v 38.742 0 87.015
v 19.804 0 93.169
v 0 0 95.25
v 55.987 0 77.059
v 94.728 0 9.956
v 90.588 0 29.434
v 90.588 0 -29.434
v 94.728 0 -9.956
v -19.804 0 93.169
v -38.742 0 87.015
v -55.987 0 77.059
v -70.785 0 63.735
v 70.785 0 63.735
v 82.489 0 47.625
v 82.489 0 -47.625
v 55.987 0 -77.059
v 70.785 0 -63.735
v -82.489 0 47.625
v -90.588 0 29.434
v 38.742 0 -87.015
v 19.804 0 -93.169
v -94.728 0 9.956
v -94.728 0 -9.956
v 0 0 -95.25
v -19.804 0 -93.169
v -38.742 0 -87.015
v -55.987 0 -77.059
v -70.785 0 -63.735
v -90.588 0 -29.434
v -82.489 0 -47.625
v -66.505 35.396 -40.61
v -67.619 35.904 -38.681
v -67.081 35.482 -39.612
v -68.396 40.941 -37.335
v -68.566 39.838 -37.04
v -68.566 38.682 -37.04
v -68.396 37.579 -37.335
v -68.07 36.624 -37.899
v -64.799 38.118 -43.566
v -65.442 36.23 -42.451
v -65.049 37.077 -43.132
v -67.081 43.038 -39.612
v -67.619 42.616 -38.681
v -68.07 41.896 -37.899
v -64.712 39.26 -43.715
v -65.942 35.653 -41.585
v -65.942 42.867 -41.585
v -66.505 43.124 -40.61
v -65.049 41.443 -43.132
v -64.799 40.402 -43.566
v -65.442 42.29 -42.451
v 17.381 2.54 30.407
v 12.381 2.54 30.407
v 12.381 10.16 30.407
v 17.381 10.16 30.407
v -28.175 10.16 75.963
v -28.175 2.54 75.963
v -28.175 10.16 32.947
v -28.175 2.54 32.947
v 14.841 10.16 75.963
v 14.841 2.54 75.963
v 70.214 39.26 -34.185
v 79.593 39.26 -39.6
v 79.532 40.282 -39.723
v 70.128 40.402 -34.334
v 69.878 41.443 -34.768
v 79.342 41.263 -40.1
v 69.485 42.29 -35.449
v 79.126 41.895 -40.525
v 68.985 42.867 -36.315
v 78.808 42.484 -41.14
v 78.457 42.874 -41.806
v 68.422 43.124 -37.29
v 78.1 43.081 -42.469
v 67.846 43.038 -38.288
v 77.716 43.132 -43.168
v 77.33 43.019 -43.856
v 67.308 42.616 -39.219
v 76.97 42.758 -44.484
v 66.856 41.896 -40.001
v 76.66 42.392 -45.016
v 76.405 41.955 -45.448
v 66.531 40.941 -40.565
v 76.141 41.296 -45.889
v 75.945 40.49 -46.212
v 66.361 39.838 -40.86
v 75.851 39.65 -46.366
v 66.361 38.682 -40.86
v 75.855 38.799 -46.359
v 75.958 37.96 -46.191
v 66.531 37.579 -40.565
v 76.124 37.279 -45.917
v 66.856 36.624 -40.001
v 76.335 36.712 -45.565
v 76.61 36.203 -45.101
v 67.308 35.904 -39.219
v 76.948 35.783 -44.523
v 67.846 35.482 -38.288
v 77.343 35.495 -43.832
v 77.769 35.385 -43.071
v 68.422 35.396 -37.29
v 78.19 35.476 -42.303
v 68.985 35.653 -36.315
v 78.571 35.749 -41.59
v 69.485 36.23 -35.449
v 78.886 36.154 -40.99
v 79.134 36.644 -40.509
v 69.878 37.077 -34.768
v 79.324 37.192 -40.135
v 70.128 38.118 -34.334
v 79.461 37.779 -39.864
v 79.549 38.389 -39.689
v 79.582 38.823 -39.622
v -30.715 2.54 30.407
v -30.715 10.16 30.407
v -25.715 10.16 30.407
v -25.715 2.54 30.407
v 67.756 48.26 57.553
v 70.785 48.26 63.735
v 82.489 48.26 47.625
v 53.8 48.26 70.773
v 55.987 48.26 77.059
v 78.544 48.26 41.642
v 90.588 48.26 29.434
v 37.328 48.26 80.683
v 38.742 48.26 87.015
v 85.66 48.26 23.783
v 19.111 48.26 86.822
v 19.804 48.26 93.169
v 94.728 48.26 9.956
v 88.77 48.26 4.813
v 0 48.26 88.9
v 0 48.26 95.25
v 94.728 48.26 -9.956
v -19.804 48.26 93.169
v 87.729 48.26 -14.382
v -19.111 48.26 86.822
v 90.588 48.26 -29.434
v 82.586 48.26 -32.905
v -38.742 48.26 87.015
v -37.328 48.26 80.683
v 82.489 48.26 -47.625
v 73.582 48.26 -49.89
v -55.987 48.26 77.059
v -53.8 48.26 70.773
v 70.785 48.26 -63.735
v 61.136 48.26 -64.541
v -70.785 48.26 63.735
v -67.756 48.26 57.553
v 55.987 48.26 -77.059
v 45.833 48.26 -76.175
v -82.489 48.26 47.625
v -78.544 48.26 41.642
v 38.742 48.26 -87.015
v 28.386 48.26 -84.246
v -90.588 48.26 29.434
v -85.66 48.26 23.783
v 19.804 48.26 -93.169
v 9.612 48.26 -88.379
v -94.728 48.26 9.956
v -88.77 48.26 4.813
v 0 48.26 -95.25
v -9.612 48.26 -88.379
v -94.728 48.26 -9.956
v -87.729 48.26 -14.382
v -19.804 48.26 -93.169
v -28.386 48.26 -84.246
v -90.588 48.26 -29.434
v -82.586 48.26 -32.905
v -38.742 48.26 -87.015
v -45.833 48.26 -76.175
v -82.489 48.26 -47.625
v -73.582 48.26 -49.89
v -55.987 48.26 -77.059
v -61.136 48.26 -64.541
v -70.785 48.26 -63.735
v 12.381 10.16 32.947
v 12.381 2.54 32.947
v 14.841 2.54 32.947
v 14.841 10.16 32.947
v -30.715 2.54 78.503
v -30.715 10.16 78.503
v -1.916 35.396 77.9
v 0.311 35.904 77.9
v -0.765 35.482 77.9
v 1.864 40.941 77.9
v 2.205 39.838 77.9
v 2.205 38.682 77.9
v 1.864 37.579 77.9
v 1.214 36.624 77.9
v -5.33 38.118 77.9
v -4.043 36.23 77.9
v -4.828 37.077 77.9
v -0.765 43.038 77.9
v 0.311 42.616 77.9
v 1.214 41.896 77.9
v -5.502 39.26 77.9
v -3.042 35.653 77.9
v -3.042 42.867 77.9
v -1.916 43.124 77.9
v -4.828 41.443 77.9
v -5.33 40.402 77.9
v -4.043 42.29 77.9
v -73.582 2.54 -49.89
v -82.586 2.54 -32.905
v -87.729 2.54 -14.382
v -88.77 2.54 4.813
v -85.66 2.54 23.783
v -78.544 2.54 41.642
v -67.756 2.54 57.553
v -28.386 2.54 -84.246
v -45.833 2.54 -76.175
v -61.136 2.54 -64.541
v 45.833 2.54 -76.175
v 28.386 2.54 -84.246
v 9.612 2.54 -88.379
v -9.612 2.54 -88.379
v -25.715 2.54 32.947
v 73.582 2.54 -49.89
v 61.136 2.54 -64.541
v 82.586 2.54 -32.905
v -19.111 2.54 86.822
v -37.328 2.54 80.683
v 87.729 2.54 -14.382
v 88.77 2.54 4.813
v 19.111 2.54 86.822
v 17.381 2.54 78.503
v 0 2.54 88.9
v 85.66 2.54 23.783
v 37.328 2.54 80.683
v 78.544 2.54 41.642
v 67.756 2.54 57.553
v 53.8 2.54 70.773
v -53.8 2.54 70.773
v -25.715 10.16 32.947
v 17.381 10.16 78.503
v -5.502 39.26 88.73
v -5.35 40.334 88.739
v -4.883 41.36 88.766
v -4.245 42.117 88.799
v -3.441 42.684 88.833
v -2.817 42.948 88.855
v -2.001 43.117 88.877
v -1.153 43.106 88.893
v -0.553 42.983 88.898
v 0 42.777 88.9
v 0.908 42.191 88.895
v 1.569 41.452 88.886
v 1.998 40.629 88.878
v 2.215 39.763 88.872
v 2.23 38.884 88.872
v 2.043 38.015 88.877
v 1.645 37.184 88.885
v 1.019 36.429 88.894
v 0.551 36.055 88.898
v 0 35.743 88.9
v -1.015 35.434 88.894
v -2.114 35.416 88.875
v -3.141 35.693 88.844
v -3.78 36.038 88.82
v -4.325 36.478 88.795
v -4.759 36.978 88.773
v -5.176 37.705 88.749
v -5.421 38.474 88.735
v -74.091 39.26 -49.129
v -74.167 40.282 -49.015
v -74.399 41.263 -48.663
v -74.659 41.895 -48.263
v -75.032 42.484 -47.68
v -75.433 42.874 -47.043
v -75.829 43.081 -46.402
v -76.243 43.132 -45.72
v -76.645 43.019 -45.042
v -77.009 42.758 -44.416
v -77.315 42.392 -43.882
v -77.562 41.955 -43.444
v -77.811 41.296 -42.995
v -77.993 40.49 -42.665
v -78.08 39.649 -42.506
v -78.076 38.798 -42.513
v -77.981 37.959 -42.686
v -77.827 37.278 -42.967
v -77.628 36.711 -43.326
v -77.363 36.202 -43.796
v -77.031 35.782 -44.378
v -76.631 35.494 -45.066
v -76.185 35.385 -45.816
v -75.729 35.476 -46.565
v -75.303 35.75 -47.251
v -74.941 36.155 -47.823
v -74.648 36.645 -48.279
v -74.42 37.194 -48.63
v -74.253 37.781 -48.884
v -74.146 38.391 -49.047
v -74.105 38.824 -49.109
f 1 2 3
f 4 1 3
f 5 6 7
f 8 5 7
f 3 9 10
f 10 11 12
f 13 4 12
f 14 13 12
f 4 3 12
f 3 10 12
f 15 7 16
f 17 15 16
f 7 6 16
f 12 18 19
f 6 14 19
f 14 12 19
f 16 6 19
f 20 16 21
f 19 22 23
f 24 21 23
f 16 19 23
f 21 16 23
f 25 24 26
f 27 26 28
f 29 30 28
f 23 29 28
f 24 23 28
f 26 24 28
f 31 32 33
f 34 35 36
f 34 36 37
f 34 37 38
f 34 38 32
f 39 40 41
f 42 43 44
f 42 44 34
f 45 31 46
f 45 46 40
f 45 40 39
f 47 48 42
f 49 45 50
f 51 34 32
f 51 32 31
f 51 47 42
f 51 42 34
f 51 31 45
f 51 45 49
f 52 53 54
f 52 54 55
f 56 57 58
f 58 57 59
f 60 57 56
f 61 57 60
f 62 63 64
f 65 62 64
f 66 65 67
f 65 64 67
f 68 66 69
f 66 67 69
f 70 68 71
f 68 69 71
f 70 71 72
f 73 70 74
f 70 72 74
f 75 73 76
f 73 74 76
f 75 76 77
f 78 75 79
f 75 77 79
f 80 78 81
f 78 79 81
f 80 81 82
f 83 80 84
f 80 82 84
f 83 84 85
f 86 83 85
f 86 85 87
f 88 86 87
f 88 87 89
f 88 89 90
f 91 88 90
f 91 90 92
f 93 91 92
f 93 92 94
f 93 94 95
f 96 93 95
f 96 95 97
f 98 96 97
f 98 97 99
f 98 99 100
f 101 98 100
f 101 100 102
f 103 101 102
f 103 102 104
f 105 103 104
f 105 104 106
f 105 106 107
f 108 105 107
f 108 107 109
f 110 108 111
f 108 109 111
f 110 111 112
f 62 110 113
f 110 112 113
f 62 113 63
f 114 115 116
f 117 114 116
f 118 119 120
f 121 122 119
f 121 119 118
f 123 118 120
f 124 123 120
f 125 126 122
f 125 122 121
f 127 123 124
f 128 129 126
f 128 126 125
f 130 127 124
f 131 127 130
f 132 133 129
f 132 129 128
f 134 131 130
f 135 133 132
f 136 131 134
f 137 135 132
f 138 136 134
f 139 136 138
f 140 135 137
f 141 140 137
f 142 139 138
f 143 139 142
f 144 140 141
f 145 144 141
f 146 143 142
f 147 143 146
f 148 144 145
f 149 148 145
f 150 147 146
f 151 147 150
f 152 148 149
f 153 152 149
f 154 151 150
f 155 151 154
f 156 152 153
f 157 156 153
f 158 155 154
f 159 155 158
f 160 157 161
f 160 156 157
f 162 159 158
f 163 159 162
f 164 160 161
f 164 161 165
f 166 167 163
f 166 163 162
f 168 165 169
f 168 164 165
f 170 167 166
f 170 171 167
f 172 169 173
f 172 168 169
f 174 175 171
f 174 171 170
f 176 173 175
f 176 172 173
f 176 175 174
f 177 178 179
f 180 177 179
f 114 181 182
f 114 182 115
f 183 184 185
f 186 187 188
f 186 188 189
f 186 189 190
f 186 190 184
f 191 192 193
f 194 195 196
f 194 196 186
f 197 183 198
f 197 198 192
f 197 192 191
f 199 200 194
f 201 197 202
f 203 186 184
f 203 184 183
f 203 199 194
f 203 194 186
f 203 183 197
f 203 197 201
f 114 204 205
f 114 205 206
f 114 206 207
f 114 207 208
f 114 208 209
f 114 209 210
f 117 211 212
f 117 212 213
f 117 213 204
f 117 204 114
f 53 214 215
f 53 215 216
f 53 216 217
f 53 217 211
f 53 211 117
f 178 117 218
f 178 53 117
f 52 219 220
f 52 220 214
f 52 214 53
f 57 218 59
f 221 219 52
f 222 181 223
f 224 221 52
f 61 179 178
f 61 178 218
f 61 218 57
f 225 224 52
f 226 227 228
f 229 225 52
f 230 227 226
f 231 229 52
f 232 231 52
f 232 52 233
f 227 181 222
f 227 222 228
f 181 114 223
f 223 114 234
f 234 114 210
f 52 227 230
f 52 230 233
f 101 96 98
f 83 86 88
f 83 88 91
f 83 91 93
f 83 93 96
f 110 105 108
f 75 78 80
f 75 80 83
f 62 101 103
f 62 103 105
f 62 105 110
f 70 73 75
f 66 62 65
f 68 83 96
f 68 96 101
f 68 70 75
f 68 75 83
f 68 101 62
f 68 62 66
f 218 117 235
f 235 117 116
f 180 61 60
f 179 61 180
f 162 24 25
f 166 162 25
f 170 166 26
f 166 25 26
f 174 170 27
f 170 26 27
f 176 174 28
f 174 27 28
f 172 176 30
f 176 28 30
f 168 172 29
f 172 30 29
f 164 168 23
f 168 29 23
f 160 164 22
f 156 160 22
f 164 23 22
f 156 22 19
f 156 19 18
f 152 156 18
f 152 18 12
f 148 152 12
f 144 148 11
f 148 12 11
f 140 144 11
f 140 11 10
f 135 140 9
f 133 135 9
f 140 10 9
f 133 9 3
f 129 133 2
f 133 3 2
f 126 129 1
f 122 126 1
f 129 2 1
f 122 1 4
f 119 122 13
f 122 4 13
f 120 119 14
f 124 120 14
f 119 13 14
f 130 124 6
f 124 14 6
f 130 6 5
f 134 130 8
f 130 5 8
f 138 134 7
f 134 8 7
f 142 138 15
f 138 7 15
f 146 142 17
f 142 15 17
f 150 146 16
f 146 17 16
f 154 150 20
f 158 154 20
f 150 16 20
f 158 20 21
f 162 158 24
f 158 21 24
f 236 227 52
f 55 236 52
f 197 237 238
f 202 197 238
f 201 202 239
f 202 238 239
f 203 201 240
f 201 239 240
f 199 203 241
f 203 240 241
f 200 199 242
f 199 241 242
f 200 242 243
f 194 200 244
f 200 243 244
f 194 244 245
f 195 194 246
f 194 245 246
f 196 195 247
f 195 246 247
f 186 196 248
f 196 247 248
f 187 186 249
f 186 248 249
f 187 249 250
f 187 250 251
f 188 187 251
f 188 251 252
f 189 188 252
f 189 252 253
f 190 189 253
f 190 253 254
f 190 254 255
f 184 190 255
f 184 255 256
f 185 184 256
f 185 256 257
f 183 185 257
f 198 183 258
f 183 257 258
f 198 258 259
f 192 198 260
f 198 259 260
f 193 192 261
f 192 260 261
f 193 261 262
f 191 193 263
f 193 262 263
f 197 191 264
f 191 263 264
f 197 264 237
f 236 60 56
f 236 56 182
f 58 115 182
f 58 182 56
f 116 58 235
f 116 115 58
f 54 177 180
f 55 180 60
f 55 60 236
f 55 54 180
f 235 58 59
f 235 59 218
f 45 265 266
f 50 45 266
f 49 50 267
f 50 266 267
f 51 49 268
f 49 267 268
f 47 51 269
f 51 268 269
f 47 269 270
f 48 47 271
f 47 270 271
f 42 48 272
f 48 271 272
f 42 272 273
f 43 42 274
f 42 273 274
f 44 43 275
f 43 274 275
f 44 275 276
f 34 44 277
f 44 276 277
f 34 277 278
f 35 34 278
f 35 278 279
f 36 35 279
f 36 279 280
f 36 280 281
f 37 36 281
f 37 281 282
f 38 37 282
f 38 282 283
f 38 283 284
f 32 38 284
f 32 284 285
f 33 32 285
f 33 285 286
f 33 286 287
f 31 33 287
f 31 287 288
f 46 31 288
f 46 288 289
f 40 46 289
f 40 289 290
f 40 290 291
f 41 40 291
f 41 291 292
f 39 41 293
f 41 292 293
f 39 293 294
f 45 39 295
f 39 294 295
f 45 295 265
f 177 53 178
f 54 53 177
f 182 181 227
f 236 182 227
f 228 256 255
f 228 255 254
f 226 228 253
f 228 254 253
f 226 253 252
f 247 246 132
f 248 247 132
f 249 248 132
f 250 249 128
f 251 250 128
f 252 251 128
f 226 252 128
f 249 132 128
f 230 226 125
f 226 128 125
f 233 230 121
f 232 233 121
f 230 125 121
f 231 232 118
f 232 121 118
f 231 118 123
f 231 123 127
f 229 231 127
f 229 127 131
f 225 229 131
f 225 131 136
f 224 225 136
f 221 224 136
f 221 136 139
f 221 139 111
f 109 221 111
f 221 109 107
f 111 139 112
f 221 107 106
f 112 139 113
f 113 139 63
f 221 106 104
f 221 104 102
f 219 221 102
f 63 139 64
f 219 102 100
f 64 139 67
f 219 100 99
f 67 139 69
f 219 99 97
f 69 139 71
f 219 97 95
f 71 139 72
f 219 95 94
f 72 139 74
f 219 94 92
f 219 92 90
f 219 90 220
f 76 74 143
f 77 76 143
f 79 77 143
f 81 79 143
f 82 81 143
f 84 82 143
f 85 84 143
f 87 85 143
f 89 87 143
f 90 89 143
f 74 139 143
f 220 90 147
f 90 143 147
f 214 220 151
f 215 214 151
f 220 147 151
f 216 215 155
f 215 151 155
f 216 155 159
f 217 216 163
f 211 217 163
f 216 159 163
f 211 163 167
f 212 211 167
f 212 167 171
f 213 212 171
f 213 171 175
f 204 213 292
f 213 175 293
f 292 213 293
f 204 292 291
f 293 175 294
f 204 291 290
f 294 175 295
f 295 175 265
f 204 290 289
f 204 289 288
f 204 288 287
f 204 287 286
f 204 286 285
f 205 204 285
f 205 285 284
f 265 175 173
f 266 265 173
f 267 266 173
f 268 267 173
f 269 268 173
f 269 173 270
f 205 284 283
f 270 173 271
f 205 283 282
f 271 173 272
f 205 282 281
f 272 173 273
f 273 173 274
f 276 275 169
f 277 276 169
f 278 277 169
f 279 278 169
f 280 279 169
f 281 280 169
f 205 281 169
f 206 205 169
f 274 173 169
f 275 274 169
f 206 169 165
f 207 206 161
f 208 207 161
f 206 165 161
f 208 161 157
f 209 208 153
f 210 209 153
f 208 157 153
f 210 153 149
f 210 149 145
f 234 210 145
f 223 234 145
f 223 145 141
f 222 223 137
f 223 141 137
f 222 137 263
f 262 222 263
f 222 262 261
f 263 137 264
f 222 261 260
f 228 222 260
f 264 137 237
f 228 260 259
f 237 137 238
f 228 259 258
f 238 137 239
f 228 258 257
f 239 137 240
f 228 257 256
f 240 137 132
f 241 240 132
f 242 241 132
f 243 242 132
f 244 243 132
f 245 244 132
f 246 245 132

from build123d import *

# Parameters (mm, degrees)
SKETCH1_R           = 95.25
BOSS_EXTRUDE1_DEPTH = 48.26
SKETCH2_R           = 88.9
CUT_EXTRUDE1_DEPTH  = 45.72
SKETCH3_R           = 3.875
BOSS_EXTRUDE4_DEPTH = 11
CIRPATTERN1_COUNT   = 3
SKETCH8_W           = 48.096
SKETCH8_H           = 48.096
SKETCH8_W_2         = 43.016
SKETCH8_H_2         = 43.016
BOSS_EXTRUDE5_DEPTH = 7.62
SKETCH10_W          = 38.096
SKETCH10_H          = 7.62
CUT_EXTRUDE2_DEPTH  = 2.54


with BuildPart() as part:
    # Sketch1 → Boss-Extrude1 (new body)
    with BuildSketch(Plane(origin=(0, 0, 0), x_dir=(1, 0, 0), z_dir=(0, 1, 0))):
        with Locations(Location((0, 0, 0), (0, 0, 90))):
            Circle(SKETCH1_R)
    extrude(amount=BOSS_EXTRUDE1_DEPTH)

    # Sketch2 → Cut-Extrude1 (cut)
    with BuildSketch(Plane(origin=(0, 48.26, 0), x_dir=(1, 0, 0), z_dir=(0, 1, 0))):
        with Locations(Location((0, 0, 0), (0, 0, 270))):
            Circle(SKETCH2_R)
    extrude(amount=-CUT_EXTRUDE1_DEPTH, mode=Mode.SUBTRACT)

    # Sketch3 → Boss-Extrude4 (add)
    with BuildSketch(Plane(origin=(0, 0, 88.9), x_dir=(-1, 0, 0), z_dir=(0, 0, -1))):
        with Locations((1.626800498, 39.26)):
            Circle(SKETCH3_R)
    boss_extrude4 = extrude(amount=BOSS_EXTRUDE4_DEPTH)

    # CirPattern1: Boss-Extrude4 ×3 about axis
    cirpattern1_axis = Axis((0, 0, 0), (0, 1, 0))
    for i in range(1, CIRPATTERN1_COUNT):
        add(boss_extrude4.rotate(cirpattern1_axis, i * 360 / CIRPATTERN1_COUNT))

    # Sketch8 → Boss-Extrude5 (add)
    with BuildSketch(Plane(origin=(0, 2.54, 0), x_dir=(1, 0, 0), z_dir=(0, 1, 0))):
        with Locations((-6.666911053, -54.455125388)):
            Rectangle(SKETCH8_W, SKETCH8_H)
        with Locations((-6.666911053, -54.455125388)):
            Rectangle(SKETCH8_W_2, SKETCH8_H_2, mode=Mode.SUBTRACT)
    extrude(amount=BOSS_EXTRUDE5_DEPTH)

    # Sketch10 → Cut-Extrude2 (cut)
    with BuildSketch(Plane(origin=(0, 0, 30.407125388), x_dir=(-1, 0, 0), z_dir=(0, 0, -1))):
        with Locations((6.666911053, 6.35)):
            Rectangle(SKETCH10_W, SKETCH10_H)
    extrude(amount=-CUT_EXTRUDE2_DEPTH, mode=Mode.SUBTRACT)


solid = part.part
